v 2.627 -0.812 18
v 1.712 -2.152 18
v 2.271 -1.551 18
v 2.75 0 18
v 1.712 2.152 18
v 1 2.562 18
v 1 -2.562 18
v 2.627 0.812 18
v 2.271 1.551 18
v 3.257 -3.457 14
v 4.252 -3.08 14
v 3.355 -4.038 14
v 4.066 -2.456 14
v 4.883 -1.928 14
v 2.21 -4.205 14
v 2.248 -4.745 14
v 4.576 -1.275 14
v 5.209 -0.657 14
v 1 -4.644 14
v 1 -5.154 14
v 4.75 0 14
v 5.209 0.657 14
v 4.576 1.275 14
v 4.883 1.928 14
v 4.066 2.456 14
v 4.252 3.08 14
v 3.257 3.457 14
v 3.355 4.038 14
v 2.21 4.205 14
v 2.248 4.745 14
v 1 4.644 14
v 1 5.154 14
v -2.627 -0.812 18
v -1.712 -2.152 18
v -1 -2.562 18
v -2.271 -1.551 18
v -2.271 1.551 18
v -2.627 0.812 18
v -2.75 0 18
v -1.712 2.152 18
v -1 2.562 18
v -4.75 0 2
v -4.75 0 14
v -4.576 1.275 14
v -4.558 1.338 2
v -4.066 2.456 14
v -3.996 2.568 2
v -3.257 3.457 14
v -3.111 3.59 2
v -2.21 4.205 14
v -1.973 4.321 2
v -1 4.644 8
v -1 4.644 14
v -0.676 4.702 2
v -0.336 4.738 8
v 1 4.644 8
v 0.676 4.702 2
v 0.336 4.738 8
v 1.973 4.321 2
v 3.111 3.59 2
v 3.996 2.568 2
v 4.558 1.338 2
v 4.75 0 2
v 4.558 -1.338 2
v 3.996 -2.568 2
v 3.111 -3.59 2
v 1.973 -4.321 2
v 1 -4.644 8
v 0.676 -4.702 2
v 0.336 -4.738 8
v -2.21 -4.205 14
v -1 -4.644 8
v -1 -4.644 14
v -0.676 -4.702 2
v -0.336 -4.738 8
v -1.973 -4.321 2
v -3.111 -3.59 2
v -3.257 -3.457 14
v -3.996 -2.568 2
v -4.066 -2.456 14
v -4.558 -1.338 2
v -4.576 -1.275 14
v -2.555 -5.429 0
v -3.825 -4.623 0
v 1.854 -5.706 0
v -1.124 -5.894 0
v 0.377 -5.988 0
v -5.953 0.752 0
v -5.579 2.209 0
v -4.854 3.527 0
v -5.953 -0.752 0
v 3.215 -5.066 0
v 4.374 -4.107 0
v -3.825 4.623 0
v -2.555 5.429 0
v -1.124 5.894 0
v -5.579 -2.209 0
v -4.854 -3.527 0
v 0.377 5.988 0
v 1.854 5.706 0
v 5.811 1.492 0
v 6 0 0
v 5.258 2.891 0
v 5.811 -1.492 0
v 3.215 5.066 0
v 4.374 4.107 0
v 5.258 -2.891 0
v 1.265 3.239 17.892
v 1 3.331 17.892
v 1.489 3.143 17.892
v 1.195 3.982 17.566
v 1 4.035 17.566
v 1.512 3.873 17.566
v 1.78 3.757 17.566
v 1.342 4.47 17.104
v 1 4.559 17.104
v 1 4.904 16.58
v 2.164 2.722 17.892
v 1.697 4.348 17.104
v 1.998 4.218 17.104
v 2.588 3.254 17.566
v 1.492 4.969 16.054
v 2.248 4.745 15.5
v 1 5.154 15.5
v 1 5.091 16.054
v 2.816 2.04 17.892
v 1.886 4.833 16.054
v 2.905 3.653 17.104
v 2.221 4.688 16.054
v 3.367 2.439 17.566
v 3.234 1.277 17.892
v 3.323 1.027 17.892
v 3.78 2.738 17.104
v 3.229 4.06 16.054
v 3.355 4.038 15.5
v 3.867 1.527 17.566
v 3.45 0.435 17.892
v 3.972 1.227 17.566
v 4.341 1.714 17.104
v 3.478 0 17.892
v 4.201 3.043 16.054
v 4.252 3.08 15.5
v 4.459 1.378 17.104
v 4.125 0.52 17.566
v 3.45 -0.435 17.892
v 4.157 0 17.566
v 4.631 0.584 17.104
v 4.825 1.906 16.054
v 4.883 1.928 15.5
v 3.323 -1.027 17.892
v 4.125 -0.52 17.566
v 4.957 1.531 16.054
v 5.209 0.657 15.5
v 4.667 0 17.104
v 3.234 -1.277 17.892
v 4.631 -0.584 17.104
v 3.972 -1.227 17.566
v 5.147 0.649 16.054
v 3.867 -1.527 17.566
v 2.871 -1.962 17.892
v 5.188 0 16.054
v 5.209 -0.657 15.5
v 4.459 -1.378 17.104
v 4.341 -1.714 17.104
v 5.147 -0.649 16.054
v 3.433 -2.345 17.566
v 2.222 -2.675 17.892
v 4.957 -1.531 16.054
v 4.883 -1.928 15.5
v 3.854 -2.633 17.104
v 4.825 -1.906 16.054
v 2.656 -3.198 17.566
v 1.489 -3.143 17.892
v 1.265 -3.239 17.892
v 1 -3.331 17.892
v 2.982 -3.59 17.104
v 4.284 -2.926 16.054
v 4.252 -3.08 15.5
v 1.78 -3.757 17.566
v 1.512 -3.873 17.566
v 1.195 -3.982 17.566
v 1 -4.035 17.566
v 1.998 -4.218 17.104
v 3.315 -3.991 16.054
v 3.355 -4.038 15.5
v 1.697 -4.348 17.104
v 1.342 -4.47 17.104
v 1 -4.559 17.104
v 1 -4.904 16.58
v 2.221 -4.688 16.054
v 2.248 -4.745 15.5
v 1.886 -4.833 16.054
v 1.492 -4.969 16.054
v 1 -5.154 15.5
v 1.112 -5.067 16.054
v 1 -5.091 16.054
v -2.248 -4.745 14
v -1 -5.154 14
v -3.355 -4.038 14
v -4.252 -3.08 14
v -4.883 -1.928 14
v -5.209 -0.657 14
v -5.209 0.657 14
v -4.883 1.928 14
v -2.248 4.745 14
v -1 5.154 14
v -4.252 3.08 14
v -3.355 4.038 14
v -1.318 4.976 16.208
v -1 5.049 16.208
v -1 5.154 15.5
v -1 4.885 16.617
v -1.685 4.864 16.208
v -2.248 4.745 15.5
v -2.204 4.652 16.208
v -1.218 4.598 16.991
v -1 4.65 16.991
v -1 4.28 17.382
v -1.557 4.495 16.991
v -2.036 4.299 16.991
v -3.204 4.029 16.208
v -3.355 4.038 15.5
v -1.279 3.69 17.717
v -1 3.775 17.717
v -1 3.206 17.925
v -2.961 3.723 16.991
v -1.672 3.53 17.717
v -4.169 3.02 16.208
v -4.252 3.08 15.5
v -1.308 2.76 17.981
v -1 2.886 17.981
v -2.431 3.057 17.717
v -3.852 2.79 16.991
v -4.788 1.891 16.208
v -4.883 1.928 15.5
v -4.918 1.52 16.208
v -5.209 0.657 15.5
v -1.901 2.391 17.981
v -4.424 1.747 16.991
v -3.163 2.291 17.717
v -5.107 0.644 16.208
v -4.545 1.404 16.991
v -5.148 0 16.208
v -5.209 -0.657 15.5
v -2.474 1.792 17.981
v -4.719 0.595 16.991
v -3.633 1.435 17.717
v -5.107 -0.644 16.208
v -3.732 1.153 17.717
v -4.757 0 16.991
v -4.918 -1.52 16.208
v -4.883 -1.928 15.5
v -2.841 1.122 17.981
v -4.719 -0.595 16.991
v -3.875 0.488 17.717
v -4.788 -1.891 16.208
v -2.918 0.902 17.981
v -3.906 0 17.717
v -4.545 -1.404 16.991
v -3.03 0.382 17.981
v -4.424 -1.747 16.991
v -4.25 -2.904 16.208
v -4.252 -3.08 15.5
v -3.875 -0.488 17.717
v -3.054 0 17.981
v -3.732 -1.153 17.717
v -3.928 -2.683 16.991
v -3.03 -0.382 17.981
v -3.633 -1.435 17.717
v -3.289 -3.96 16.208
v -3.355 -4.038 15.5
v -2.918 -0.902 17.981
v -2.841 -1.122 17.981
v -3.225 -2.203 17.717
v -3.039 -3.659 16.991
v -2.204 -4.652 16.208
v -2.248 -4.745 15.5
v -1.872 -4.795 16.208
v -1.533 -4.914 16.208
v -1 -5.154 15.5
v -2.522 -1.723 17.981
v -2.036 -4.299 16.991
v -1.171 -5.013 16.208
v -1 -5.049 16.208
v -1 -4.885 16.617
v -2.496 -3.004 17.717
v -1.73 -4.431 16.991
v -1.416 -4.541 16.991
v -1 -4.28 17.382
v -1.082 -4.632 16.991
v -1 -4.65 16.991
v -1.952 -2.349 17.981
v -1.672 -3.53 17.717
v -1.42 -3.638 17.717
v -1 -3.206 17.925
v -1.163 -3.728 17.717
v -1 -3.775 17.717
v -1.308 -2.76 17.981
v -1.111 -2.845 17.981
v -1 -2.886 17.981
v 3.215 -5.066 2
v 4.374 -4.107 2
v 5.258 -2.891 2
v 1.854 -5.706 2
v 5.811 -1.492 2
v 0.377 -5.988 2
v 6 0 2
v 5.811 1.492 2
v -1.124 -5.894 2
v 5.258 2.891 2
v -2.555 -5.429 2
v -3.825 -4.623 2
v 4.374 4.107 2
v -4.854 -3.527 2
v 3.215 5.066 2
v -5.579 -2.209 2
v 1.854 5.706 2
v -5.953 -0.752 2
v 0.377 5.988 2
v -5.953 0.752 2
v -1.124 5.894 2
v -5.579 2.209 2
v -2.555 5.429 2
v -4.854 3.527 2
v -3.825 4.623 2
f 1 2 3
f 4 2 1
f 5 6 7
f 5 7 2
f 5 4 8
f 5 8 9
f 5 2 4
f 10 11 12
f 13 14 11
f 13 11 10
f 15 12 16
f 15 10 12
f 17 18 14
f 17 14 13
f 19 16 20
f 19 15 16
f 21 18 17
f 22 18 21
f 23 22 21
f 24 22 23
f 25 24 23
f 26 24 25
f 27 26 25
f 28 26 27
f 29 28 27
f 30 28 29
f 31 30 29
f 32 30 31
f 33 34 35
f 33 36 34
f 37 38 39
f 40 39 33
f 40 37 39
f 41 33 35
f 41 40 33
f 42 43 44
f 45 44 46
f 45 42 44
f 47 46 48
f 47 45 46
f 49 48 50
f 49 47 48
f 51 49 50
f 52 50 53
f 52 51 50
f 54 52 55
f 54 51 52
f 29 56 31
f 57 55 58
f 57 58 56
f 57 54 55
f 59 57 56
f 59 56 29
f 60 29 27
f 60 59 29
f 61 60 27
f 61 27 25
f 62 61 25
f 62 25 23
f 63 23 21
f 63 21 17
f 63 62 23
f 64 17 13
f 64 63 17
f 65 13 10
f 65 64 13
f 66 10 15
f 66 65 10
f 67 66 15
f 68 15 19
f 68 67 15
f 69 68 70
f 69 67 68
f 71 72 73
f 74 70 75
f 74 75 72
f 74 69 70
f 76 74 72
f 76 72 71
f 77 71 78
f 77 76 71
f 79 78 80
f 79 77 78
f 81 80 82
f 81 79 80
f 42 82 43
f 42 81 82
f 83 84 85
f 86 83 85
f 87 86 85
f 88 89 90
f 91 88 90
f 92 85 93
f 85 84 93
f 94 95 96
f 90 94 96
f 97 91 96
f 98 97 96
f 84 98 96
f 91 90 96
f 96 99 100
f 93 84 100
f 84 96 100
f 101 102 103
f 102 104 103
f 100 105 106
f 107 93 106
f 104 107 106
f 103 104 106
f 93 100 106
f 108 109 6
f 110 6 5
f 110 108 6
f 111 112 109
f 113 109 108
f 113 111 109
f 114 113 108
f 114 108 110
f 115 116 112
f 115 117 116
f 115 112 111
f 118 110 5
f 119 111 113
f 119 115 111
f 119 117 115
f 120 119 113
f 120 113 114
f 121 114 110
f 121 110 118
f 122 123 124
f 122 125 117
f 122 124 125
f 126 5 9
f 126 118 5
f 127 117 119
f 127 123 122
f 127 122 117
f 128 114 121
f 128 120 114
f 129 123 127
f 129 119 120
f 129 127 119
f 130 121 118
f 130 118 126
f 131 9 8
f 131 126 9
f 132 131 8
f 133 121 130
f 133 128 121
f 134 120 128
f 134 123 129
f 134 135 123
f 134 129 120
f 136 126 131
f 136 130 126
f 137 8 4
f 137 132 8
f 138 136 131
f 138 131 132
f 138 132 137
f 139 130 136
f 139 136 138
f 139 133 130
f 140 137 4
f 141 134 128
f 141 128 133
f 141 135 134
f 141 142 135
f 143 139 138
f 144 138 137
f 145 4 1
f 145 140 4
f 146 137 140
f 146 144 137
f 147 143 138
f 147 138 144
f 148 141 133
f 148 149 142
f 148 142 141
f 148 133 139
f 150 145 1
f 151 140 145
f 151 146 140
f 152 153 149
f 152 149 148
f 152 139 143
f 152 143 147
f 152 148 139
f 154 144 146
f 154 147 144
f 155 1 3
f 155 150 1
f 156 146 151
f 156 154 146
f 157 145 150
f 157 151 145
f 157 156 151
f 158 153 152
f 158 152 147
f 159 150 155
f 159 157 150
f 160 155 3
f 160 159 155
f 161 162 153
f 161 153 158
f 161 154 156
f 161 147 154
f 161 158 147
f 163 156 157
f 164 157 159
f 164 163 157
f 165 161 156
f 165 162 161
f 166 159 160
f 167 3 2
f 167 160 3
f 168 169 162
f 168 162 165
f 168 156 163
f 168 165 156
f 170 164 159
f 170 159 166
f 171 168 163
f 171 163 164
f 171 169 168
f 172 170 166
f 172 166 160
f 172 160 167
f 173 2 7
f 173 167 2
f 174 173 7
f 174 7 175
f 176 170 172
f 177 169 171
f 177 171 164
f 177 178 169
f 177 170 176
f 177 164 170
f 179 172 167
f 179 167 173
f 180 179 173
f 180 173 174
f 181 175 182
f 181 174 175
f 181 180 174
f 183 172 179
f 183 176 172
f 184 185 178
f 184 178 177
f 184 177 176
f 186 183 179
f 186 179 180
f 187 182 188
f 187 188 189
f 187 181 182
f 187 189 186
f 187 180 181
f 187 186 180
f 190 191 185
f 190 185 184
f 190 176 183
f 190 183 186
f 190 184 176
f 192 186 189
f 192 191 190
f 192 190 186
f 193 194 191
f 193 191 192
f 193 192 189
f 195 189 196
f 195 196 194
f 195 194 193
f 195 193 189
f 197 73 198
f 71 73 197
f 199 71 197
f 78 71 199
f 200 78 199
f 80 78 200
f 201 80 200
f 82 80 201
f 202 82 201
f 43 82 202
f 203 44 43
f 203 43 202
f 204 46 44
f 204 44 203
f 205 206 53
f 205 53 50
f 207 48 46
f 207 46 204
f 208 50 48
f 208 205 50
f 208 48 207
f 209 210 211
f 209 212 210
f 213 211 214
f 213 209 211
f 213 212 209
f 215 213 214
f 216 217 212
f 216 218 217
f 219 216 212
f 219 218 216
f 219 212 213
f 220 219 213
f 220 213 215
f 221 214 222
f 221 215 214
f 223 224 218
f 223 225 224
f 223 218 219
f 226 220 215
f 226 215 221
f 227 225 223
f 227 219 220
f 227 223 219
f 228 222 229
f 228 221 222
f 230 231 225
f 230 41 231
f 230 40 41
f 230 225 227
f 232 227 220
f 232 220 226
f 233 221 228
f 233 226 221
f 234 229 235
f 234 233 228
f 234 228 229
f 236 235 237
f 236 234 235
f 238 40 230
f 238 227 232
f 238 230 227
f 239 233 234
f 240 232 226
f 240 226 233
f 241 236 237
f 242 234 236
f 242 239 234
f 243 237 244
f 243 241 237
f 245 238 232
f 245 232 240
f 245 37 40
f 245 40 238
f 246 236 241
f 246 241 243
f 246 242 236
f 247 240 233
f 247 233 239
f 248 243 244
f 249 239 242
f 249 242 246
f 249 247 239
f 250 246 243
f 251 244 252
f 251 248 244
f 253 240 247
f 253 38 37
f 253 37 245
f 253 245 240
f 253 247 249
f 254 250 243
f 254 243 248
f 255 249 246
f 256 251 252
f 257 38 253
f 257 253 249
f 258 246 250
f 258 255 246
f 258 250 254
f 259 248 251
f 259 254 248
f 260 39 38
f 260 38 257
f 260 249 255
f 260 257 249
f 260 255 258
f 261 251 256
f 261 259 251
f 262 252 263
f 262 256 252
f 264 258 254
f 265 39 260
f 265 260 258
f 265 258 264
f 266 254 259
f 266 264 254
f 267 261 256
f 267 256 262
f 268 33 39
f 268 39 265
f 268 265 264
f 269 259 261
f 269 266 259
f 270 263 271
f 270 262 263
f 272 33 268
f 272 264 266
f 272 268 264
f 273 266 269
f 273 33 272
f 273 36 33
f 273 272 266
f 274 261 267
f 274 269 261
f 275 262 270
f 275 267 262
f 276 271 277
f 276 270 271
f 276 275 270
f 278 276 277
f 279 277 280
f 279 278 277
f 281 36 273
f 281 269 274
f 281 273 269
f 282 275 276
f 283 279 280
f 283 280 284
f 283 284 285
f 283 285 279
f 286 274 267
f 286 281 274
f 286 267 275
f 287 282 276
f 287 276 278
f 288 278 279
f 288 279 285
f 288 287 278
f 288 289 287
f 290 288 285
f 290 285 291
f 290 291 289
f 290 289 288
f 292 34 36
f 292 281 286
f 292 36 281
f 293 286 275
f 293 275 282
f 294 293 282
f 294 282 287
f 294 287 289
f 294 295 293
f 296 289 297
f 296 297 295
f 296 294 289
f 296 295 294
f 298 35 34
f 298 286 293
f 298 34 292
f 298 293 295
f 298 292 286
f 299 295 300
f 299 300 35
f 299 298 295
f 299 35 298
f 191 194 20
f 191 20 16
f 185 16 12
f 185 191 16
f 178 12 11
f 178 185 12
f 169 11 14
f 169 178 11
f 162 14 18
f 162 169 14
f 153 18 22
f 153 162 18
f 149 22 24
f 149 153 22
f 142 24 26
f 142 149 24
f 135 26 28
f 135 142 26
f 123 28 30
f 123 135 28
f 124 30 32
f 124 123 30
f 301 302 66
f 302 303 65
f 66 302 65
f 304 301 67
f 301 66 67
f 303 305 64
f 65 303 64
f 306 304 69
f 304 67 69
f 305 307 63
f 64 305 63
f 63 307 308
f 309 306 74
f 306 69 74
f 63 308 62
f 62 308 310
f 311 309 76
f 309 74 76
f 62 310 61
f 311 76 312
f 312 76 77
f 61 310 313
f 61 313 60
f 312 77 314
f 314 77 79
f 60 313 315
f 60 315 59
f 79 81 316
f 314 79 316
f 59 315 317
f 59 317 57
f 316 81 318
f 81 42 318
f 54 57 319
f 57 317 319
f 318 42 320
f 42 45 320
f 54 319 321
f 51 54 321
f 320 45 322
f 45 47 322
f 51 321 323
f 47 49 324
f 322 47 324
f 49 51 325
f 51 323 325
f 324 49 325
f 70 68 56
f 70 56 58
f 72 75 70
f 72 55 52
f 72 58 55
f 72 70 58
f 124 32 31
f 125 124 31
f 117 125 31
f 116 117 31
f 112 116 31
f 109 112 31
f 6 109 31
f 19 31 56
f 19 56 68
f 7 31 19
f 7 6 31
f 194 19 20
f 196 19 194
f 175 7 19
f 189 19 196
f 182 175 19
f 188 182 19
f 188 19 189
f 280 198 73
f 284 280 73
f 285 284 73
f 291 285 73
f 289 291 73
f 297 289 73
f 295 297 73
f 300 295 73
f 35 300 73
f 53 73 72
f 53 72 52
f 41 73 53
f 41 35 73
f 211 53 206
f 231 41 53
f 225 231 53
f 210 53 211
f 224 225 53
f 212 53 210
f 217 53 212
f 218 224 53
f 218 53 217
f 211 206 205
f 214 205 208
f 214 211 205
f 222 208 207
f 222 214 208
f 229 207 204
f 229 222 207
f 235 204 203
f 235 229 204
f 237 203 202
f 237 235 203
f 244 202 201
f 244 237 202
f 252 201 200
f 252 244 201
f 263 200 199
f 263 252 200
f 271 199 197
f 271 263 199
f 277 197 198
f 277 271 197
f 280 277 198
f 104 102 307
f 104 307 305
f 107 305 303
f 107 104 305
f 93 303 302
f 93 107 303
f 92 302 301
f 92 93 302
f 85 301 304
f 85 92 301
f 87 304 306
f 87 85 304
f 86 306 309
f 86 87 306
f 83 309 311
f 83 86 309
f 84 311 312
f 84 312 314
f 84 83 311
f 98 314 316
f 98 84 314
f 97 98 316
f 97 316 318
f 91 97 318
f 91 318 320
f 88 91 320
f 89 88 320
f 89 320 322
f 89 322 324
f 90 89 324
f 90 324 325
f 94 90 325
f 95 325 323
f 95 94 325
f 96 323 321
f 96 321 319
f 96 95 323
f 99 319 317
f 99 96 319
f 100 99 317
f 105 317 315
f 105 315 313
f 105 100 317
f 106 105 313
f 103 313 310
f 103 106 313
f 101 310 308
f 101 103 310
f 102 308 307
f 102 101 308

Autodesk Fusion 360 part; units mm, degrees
sketch "Boceto1" plane through (0, 0, 0) normal (0, 0, 1) x (1, 0, 0)
  circle A0 centre (0, 0) radius 6
  dimension "d1" = 12
extrude "Extruir1" add sketch "Boceto1" along normal blind 18
ref_plane "PlanoDeObra1" through (0, 0, 2) normal (0, 0, -1) x (-1, 0, 0)
sketch "Boceto2" plane through (0, 0, 2) normal (0, 0, -1) x (-1, 0, 0)
  circle A0 centre (0, 0) radius 4.75
  circle A1 centre (0, 0) radius 6
  dimension "d5" = 9.5
  dimension "d6" = 12
extrude "Extruir2" cut sketch "Boceto2" against normal blind 12
sketch "Boceto3" plane through (0, 0, 18) normal (0, 0, 1) x (-1, 0, 0)
  line L0 (-1, 7) -> (1, 7)
  line L1 (1, 7) -> (1, -7)
  line L2 (1, -7) -> (-1, -7)
  line L3 (-1, -7) -> (-1, 7)
  circle A0 centre (0, 0) radius 10
  circle A1 centre (0, 0) radius 6
  circle A2 centre (0, 0) radius 5.25
  circle A3 centre (0, 0) radius 6
  dimension "d11" = 2
  dimension "d12" = 1
  dimension "d15" = 10.5
  dimension "d16" = 12
extrude "Extruir3" cut sketch "Boceto3" against normal blind 10 contours L0 L1 L3 A1 A3 | L1 L3 A1 A2 A3 | L3 A1 A2 A3 | L1 A1 A2 A3 | L1 L3 A2 | L1 L2 L3 A1 A3 | L1 L3 A1 A2 A3
fillet "Empalme3" radius 2.5 2 edges at (5.25, 0, 18) (-5.25, 0, 18)
